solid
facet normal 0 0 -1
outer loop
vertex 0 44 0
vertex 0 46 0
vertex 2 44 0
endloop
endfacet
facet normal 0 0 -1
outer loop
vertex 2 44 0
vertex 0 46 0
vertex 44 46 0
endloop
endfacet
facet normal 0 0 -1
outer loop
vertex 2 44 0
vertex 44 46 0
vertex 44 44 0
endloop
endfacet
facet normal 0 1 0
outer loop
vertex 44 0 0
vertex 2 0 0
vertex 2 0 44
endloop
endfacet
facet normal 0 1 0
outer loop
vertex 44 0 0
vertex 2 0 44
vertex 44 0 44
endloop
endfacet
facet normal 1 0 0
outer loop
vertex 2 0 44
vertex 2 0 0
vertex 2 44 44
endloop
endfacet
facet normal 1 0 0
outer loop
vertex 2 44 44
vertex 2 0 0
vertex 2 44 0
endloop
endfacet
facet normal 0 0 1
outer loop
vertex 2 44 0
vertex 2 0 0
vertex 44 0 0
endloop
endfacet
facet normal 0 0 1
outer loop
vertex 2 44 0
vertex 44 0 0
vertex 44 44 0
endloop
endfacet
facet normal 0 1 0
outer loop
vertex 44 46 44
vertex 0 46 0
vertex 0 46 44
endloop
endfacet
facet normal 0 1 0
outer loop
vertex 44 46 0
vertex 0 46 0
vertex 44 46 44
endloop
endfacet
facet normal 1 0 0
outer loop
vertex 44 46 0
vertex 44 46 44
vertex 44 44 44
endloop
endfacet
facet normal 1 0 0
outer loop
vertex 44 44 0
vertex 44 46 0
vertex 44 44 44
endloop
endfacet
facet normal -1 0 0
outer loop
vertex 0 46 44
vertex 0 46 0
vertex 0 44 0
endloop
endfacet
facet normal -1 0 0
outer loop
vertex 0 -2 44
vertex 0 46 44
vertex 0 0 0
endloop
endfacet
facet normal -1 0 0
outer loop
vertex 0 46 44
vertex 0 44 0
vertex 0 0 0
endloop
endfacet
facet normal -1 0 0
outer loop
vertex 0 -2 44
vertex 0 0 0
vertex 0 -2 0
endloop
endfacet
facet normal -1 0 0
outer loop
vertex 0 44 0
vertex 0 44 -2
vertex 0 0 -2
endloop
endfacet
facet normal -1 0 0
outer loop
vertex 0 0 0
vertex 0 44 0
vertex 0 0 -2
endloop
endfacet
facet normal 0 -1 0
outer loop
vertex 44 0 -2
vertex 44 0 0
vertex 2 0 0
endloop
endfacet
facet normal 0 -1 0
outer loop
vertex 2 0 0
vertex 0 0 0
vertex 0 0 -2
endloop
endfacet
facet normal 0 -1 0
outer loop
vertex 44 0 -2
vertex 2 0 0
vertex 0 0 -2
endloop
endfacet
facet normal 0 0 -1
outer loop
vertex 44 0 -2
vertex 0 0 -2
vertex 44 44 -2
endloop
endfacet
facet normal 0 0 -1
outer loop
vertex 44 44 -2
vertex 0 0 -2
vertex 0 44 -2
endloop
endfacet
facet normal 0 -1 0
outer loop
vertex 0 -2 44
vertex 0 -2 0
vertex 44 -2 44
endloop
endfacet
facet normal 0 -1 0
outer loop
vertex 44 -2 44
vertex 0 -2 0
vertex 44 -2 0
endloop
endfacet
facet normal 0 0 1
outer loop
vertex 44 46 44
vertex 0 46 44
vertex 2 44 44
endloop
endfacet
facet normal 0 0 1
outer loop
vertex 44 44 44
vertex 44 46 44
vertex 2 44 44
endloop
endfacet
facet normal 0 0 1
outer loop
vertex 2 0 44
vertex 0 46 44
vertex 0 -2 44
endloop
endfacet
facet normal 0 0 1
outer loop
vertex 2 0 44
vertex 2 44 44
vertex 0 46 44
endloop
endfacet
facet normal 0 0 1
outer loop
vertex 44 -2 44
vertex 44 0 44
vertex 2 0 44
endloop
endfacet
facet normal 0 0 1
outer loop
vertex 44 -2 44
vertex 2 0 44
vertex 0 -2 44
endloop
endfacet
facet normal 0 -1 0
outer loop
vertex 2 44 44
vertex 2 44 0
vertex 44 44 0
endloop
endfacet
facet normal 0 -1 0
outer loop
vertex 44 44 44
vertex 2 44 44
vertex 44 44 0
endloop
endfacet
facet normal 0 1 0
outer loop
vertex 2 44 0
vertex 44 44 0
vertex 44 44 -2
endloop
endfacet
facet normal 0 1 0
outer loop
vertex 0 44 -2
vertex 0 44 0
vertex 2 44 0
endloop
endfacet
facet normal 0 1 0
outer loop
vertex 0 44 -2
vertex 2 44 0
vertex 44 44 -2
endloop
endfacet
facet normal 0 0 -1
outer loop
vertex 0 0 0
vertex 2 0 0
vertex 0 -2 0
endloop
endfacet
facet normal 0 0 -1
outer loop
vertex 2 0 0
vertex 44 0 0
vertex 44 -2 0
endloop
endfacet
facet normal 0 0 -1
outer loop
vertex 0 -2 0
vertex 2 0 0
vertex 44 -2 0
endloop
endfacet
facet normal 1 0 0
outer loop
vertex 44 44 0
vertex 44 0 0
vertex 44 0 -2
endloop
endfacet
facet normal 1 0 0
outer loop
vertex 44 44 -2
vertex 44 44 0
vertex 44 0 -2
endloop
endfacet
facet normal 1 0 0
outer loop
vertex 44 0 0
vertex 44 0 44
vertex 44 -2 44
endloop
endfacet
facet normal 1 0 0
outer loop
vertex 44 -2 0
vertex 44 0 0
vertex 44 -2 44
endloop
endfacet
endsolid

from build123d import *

# Parameters (mm, degrees)
BOX001_W     = 2
BOX001_H     = 44
BOX001_DEPTH = 44
BOX002_W     = 2
BOX002_H     = 44
BOX002_DEPTH = 44
BOX003_W     = 2
BOX003_H     = 44
BOX003_DEPTH = 44
BOX_W        = 2
BOX_H        = 44
BOX_DEPTH    = 44


with BuildPart() as cubo001:
    # Box001 → Box001 (new body)
    with BuildSketch(Plane(origin=(0, 0, 0), x_dir=(0, -1, 0), z_dir=(0, 0, 1))):
        with Locations((1, 22)):
            Rectangle(BOX001_W, BOX001_H)
    extrude(amount=BOX001_DEPTH)


with BuildPart() as cubo002:
    # Box002 → Box002 (new body)
    with BuildSketch(Plane(origin=(0, 46, 0), x_dir=(0, -1, 0), z_dir=(0, 0, 1))):
        with Locations((1, 22)):
            Rectangle(BOX002_W, BOX002_H)
    extrude(amount=BOX002_DEPTH)


with BuildPart() as cubo003:
    # Box003 → Box003 (new body)
    with BuildSketch(Plane(origin=(0, 0, 0), x_dir=(0, 0, -1), z_dir=(1, 0, 0))):
        with Locations((1, 22)):
            Rectangle(BOX003_W, BOX003_H)
    extrude(amount=BOX003_DEPTH)


with BuildPart() as fusion:
    # Box → Box (new body)
    with BuildSketch(Plane.XY):
        with Locations((1, 22)):
            Rectangle(BOX_W, BOX_H)
    extrude(amount=BOX_DEPTH)

    # Fusion: union Cubo001, Cubo002, Cubo003
    add(cubo001.part)
    add(cubo002.part)
    add(cubo003.part)


solid = fusion.part
